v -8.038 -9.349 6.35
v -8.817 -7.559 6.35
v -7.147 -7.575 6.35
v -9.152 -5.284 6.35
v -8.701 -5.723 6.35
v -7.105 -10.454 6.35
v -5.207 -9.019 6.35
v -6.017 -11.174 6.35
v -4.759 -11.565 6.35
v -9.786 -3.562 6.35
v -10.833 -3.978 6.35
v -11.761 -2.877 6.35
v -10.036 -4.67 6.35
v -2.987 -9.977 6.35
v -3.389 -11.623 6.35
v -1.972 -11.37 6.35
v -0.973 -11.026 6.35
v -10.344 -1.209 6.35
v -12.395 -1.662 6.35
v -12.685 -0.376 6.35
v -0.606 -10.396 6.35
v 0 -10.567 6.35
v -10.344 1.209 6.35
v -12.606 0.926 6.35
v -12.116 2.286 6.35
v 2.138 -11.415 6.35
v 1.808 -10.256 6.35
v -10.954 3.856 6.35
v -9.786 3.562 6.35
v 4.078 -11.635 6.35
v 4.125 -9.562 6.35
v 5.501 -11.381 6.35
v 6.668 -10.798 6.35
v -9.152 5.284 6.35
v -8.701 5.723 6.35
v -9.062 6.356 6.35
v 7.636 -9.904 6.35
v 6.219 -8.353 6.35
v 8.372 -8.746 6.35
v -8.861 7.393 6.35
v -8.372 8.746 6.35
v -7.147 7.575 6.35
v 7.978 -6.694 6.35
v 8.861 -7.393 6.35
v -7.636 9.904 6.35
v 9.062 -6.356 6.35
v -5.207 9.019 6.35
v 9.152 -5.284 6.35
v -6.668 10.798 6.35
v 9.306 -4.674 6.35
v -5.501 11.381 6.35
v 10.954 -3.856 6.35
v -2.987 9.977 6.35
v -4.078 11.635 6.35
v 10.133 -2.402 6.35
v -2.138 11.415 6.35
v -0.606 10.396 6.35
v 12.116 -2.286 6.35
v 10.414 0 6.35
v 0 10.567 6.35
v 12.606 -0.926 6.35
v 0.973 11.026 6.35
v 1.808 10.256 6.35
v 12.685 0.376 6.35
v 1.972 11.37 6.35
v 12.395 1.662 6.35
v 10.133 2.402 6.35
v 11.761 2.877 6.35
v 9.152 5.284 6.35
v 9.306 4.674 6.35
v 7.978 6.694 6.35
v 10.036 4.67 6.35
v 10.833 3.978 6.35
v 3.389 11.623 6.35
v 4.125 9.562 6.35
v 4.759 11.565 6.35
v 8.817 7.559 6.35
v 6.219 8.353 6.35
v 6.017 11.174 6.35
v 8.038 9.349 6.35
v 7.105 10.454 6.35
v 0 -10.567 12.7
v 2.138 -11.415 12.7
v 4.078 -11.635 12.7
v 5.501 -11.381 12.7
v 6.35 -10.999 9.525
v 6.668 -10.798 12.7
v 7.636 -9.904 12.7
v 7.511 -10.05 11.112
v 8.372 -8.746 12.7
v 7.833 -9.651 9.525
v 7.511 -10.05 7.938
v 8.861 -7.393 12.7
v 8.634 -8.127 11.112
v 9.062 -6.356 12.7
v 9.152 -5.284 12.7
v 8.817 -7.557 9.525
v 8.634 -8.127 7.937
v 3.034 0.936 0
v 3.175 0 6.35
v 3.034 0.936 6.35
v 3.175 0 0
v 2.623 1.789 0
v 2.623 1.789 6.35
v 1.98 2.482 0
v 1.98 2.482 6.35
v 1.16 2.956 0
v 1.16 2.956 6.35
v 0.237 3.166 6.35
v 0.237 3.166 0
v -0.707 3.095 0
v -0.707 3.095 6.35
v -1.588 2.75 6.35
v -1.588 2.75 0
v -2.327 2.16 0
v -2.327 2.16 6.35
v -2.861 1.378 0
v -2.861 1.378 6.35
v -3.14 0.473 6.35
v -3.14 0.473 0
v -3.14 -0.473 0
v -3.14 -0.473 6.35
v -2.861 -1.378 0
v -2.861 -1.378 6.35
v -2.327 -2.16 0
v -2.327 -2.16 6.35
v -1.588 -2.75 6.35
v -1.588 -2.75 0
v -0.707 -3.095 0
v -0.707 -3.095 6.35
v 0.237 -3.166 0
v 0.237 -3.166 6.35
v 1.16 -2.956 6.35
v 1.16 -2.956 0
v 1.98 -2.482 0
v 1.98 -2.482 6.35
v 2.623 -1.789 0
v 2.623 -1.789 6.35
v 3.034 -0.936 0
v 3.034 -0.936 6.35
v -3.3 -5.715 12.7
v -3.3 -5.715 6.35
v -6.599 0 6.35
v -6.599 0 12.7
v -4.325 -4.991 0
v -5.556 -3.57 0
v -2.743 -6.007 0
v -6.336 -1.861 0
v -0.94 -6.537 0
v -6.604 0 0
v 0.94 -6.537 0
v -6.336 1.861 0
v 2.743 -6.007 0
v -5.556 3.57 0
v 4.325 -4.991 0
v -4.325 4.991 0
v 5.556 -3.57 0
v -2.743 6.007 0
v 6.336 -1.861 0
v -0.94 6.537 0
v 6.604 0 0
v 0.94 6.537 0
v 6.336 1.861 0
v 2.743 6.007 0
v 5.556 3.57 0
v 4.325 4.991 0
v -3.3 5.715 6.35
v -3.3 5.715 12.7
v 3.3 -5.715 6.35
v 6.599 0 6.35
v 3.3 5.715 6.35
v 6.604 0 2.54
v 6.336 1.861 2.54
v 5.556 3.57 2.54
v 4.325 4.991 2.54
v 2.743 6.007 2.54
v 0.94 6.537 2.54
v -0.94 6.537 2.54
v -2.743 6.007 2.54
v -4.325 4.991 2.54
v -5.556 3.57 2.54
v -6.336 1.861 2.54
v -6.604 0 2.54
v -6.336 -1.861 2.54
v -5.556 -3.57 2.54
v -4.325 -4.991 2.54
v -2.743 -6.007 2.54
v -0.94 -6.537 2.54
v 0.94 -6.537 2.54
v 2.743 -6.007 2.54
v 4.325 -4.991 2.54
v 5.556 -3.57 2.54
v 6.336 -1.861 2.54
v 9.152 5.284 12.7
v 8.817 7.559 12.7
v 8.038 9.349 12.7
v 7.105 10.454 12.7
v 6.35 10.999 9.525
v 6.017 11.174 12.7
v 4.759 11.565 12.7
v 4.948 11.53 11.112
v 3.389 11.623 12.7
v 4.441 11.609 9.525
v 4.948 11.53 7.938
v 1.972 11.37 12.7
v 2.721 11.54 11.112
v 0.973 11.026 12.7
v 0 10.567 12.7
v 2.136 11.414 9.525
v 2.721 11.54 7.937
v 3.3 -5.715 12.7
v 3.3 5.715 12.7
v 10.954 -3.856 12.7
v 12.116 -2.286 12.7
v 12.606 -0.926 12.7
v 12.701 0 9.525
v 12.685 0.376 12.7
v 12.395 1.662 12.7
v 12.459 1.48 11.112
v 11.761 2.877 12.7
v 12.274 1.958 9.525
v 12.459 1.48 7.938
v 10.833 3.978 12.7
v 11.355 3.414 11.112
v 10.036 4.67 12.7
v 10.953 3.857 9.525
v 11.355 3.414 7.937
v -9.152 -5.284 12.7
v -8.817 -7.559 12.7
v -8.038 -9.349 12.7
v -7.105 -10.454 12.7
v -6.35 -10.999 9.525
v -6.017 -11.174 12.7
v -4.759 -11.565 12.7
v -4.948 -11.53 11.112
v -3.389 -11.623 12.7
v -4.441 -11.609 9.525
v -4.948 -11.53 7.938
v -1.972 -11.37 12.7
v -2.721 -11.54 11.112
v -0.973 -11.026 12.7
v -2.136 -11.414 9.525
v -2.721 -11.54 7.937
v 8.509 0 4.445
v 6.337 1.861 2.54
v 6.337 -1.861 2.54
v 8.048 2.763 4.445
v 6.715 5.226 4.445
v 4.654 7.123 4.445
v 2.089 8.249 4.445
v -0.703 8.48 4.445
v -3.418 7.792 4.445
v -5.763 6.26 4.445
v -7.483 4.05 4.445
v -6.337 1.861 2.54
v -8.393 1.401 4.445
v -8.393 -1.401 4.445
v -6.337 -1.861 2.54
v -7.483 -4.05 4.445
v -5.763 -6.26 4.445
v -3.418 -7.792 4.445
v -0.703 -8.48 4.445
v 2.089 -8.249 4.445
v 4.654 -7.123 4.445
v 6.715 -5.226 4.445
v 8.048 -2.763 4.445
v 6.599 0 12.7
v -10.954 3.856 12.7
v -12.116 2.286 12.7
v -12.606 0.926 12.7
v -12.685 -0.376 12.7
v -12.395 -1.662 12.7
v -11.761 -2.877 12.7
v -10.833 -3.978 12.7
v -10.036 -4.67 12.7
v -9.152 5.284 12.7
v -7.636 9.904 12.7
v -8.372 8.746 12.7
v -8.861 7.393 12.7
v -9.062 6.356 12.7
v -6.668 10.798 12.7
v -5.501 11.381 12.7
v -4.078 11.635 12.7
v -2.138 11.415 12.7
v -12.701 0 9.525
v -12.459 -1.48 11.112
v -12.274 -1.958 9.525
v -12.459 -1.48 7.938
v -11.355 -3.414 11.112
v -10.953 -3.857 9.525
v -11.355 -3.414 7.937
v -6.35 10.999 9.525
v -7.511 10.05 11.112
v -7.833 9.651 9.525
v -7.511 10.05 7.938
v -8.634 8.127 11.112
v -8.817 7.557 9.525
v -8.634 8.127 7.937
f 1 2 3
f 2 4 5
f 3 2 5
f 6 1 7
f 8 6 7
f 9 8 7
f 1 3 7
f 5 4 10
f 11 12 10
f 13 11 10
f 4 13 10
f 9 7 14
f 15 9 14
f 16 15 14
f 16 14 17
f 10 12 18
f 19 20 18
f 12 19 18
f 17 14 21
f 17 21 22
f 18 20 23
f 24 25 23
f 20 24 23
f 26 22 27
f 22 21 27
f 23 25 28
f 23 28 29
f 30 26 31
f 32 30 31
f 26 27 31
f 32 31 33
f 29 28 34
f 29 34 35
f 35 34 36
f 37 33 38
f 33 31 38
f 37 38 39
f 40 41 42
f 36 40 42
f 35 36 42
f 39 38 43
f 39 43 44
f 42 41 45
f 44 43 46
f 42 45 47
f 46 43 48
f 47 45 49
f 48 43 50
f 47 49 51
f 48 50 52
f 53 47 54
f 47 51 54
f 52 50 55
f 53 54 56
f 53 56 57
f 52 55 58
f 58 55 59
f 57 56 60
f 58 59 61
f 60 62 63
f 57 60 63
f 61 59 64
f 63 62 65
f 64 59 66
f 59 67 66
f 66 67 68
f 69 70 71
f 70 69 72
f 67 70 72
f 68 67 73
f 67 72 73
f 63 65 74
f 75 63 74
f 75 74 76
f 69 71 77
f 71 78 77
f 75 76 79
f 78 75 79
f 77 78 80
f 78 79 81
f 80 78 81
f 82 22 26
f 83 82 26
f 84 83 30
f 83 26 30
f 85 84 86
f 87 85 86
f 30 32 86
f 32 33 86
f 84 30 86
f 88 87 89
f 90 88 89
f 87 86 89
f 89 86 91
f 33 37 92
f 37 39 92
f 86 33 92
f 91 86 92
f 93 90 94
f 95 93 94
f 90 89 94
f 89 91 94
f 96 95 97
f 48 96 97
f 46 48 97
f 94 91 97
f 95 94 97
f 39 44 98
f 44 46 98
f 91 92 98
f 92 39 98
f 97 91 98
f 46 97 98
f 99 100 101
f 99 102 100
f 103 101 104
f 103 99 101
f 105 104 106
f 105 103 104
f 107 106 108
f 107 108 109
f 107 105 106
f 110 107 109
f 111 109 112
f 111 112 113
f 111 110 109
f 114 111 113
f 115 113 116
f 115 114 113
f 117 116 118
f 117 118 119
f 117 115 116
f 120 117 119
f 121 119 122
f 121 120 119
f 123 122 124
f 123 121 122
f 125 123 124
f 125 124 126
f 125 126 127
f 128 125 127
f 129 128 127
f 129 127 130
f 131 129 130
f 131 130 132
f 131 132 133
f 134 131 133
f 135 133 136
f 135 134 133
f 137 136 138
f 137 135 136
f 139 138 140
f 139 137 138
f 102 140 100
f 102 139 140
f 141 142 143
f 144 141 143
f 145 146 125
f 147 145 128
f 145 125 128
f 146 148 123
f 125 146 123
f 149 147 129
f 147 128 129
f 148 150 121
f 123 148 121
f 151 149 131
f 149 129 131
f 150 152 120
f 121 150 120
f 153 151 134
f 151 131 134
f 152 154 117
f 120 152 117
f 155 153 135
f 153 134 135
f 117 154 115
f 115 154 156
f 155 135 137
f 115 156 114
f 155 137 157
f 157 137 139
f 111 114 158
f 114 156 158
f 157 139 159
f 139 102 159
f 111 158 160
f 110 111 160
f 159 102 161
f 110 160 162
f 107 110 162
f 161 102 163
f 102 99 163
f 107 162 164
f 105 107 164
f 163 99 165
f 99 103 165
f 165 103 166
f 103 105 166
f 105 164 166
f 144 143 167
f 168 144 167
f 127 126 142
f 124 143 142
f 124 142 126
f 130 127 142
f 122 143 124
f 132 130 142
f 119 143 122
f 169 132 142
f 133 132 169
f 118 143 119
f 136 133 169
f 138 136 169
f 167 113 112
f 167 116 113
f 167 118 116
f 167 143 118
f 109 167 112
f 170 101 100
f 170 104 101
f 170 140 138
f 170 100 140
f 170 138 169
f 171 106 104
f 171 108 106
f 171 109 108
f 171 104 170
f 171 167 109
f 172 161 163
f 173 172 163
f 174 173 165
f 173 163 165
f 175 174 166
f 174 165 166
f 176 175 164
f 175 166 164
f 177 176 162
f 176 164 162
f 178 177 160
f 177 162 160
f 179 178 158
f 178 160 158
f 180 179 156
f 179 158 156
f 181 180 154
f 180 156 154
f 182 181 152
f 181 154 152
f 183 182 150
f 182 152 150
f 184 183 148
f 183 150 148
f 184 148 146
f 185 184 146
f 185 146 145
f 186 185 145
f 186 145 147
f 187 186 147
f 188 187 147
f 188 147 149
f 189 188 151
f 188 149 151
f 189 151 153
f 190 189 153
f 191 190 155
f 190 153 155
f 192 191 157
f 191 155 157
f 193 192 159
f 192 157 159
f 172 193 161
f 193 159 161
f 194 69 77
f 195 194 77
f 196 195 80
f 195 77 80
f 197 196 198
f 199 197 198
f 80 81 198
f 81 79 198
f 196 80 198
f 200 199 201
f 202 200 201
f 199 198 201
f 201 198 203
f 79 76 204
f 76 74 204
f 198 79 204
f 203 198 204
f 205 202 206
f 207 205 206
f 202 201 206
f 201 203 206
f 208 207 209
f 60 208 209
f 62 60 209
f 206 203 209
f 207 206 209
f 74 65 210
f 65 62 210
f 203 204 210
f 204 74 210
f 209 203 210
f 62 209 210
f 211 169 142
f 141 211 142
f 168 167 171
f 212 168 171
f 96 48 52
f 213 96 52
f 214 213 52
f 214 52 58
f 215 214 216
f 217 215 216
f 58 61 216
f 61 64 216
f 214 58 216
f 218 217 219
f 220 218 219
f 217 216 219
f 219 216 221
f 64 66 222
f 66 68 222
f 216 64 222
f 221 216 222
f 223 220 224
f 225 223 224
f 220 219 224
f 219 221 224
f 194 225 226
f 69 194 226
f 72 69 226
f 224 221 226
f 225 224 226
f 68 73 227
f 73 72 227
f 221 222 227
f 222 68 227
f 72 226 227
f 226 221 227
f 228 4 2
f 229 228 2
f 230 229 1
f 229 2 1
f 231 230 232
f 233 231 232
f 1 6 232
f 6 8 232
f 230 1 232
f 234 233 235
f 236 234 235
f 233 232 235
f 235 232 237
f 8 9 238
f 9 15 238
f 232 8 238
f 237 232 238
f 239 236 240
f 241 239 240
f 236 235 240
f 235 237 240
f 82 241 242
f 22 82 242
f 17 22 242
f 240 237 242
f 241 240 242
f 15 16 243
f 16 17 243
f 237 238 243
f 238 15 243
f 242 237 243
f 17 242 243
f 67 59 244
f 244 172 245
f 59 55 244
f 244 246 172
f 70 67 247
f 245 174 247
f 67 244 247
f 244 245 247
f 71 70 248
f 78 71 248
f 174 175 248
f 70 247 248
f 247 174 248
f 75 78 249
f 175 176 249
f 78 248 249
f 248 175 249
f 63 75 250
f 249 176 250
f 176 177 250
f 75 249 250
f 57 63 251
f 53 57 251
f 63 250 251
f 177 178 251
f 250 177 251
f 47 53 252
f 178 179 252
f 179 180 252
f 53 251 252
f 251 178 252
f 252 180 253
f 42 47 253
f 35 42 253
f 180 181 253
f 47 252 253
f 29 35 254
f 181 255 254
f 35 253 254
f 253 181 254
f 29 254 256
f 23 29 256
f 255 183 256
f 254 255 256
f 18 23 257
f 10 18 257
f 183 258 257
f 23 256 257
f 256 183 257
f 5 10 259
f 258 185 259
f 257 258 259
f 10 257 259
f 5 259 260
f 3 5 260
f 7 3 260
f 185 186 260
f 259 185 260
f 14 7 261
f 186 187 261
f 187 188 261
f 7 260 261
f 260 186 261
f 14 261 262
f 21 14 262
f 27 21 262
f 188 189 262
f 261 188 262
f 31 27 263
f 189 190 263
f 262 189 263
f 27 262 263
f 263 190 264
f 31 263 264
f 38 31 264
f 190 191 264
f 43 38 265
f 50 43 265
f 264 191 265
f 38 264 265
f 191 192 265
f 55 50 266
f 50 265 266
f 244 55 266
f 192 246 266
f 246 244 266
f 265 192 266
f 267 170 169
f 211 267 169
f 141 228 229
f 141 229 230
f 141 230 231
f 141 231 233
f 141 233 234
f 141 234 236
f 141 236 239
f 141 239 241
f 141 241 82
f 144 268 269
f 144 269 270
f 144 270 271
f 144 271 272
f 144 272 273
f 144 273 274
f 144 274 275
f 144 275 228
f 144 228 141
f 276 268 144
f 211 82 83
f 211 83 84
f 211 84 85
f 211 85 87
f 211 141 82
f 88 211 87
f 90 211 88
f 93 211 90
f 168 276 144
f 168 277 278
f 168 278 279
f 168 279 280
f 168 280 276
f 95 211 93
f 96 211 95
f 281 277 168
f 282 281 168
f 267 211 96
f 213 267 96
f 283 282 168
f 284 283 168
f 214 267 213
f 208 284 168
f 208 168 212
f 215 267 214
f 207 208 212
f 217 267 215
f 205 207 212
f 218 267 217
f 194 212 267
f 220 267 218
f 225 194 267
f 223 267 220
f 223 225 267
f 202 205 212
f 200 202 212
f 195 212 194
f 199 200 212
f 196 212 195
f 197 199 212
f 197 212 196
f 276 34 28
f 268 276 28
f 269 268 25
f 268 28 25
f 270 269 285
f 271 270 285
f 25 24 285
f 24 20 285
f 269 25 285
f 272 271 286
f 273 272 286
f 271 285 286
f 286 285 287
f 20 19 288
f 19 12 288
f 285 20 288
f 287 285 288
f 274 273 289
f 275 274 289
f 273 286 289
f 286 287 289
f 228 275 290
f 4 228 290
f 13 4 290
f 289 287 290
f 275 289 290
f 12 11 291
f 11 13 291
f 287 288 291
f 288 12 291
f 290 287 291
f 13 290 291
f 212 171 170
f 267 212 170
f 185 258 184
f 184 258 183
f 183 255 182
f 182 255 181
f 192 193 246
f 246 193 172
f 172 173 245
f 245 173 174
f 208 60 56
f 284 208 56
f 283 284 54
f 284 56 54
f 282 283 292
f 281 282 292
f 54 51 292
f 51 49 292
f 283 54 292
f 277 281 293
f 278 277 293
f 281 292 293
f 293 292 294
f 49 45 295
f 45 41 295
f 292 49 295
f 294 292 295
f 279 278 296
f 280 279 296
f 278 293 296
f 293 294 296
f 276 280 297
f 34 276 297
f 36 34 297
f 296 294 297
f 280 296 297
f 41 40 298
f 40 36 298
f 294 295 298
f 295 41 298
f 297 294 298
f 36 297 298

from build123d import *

# Parameters (mm, degrees)
F0_R     = 6.604
F0_R_2   = 3.175
F1_DEPTH = 2.54
F2_R     = 10.414
F2_R_2   = 6.604
F2_R_3   = 3.175
F3_DEPTH = 3.81
F4_SIZE  = 3.80999
F6_DEPTH = 6.35


# Not quite as in the source:
# - a fillet or chamfer is up to 0.001 mm smaller than in the source, because OpenCascade refuses the exact size


with BuildPart() as f1:
    # F0 (on Top) → F1 (new body)
    with BuildSketch(Plane.XY):
        Circle(F0_R)
        Circle(F0_R_2, mode=Mode.SUBTRACT)
    extrude(amount=F1_DEPTH)

    # F2 (on face) → F3 (join)
    with BuildSketch(Plane.XY.offset(2.54)):
        Circle(F2_R)
        Circle(F2_R_2, mode=Mode.SUBTRACT)
        Circle(F2_R_2)
        Circle(F2_R_3, mode=Mode.SUBTRACT)
    extrude(amount=F3_DEPTH)

    # F4 (size 3.81 in the source; OpenCascade refuses exactly that, so slightly less here)
    f4_edges = [f1.edges().sort_by_distance(p)[0] for p in [
        (-10.414, 0, 2.54),
    ]]
    chamfer(f4_edges, length=F4_SIZE)

    # F5 (on face) → F6 (join)
    with BuildSketch(Plane.XY.offset(6.35)):
        with BuildLine():
            add(Edge.make_bspline(
                [(0, -10.5673162871), (8.8130461977, -15.2646437839), (9.1515643544, -5.2836581435)],
                knots=[2.3754047296, 2.3754047296, 2.3754047296, 3.9077805776, 3.9077805776, 3.9077805776], degree=2, weights=[1, 0.7205591673, 1]))
            add(Edge.make_bspline(
                [(9.1515643544, -5.2836581435), (17.6260923954, 0), (9.1515643544, 5.2836581435)],
                knots=[5.5169973832, 5.5169973832, 5.5169973832, 7.0493732312, 7.0493732312, 7.0493732312], degree=2, weights=[1, 0.7205591673, 1]))
            add(Edge.make_bspline(
                [(9.1515643544, 5.2836581435), (8.8130461977, 15.2646437839), (0, 10.5673162871)],
                knots=[2.3754047296, 2.3754047296, 2.3754047296, 3.9077805776, 3.9077805776, 3.9077805776], degree=2, weights=[1, 0.7205591673, 1]))
            add(Edge.make_bspline(
                [(0, 10.5673162871), (-8.8130461977, 15.2646437839), (-9.1515643544, 5.2836581435)],
                knots=[5.5169973832, 5.5169973832, 5.5169973832, 7.0493732312, 7.0493732312, 7.0493732312], degree=2, weights=[1, 0.7205591673, 1]))
            add(Edge.make_bspline(
                [(-9.1515643544, 5.2836581435), (-17.6260923954, 0), (-9.1515643544, -5.2836581435)],
                knots=[2.3754047296, 2.3754047296, 2.3754047296, 3.9077805776, 3.9077805776, 3.9077805776], degree=2, weights=[1, 0.7205591673, 1]))
            add(Edge.make_bspline(
                [(-9.1515643544, -5.2836581435), (-8.8130461977, -15.2646437839), (0, -10.5673162871)],
                knots=[5.5169973832, 5.5169973832, 5.5169973832, 7.0493732312, 7.0493732312, 7.0493732312], degree=2, weights=[1, 0.7205591673, 1]))
        make_face()
        Polygon((-6.5991135768, 0), (-3.2995567884, 5.715), (3.2995567884, 5.715), (6.5991135768, 0), (3.2995567884, -5.715), (-3.2995567884, -5.715), align=None, mode=Mode.SUBTRACT)
    extrude(amount=F6_DEPTH)


solid = f1.part
